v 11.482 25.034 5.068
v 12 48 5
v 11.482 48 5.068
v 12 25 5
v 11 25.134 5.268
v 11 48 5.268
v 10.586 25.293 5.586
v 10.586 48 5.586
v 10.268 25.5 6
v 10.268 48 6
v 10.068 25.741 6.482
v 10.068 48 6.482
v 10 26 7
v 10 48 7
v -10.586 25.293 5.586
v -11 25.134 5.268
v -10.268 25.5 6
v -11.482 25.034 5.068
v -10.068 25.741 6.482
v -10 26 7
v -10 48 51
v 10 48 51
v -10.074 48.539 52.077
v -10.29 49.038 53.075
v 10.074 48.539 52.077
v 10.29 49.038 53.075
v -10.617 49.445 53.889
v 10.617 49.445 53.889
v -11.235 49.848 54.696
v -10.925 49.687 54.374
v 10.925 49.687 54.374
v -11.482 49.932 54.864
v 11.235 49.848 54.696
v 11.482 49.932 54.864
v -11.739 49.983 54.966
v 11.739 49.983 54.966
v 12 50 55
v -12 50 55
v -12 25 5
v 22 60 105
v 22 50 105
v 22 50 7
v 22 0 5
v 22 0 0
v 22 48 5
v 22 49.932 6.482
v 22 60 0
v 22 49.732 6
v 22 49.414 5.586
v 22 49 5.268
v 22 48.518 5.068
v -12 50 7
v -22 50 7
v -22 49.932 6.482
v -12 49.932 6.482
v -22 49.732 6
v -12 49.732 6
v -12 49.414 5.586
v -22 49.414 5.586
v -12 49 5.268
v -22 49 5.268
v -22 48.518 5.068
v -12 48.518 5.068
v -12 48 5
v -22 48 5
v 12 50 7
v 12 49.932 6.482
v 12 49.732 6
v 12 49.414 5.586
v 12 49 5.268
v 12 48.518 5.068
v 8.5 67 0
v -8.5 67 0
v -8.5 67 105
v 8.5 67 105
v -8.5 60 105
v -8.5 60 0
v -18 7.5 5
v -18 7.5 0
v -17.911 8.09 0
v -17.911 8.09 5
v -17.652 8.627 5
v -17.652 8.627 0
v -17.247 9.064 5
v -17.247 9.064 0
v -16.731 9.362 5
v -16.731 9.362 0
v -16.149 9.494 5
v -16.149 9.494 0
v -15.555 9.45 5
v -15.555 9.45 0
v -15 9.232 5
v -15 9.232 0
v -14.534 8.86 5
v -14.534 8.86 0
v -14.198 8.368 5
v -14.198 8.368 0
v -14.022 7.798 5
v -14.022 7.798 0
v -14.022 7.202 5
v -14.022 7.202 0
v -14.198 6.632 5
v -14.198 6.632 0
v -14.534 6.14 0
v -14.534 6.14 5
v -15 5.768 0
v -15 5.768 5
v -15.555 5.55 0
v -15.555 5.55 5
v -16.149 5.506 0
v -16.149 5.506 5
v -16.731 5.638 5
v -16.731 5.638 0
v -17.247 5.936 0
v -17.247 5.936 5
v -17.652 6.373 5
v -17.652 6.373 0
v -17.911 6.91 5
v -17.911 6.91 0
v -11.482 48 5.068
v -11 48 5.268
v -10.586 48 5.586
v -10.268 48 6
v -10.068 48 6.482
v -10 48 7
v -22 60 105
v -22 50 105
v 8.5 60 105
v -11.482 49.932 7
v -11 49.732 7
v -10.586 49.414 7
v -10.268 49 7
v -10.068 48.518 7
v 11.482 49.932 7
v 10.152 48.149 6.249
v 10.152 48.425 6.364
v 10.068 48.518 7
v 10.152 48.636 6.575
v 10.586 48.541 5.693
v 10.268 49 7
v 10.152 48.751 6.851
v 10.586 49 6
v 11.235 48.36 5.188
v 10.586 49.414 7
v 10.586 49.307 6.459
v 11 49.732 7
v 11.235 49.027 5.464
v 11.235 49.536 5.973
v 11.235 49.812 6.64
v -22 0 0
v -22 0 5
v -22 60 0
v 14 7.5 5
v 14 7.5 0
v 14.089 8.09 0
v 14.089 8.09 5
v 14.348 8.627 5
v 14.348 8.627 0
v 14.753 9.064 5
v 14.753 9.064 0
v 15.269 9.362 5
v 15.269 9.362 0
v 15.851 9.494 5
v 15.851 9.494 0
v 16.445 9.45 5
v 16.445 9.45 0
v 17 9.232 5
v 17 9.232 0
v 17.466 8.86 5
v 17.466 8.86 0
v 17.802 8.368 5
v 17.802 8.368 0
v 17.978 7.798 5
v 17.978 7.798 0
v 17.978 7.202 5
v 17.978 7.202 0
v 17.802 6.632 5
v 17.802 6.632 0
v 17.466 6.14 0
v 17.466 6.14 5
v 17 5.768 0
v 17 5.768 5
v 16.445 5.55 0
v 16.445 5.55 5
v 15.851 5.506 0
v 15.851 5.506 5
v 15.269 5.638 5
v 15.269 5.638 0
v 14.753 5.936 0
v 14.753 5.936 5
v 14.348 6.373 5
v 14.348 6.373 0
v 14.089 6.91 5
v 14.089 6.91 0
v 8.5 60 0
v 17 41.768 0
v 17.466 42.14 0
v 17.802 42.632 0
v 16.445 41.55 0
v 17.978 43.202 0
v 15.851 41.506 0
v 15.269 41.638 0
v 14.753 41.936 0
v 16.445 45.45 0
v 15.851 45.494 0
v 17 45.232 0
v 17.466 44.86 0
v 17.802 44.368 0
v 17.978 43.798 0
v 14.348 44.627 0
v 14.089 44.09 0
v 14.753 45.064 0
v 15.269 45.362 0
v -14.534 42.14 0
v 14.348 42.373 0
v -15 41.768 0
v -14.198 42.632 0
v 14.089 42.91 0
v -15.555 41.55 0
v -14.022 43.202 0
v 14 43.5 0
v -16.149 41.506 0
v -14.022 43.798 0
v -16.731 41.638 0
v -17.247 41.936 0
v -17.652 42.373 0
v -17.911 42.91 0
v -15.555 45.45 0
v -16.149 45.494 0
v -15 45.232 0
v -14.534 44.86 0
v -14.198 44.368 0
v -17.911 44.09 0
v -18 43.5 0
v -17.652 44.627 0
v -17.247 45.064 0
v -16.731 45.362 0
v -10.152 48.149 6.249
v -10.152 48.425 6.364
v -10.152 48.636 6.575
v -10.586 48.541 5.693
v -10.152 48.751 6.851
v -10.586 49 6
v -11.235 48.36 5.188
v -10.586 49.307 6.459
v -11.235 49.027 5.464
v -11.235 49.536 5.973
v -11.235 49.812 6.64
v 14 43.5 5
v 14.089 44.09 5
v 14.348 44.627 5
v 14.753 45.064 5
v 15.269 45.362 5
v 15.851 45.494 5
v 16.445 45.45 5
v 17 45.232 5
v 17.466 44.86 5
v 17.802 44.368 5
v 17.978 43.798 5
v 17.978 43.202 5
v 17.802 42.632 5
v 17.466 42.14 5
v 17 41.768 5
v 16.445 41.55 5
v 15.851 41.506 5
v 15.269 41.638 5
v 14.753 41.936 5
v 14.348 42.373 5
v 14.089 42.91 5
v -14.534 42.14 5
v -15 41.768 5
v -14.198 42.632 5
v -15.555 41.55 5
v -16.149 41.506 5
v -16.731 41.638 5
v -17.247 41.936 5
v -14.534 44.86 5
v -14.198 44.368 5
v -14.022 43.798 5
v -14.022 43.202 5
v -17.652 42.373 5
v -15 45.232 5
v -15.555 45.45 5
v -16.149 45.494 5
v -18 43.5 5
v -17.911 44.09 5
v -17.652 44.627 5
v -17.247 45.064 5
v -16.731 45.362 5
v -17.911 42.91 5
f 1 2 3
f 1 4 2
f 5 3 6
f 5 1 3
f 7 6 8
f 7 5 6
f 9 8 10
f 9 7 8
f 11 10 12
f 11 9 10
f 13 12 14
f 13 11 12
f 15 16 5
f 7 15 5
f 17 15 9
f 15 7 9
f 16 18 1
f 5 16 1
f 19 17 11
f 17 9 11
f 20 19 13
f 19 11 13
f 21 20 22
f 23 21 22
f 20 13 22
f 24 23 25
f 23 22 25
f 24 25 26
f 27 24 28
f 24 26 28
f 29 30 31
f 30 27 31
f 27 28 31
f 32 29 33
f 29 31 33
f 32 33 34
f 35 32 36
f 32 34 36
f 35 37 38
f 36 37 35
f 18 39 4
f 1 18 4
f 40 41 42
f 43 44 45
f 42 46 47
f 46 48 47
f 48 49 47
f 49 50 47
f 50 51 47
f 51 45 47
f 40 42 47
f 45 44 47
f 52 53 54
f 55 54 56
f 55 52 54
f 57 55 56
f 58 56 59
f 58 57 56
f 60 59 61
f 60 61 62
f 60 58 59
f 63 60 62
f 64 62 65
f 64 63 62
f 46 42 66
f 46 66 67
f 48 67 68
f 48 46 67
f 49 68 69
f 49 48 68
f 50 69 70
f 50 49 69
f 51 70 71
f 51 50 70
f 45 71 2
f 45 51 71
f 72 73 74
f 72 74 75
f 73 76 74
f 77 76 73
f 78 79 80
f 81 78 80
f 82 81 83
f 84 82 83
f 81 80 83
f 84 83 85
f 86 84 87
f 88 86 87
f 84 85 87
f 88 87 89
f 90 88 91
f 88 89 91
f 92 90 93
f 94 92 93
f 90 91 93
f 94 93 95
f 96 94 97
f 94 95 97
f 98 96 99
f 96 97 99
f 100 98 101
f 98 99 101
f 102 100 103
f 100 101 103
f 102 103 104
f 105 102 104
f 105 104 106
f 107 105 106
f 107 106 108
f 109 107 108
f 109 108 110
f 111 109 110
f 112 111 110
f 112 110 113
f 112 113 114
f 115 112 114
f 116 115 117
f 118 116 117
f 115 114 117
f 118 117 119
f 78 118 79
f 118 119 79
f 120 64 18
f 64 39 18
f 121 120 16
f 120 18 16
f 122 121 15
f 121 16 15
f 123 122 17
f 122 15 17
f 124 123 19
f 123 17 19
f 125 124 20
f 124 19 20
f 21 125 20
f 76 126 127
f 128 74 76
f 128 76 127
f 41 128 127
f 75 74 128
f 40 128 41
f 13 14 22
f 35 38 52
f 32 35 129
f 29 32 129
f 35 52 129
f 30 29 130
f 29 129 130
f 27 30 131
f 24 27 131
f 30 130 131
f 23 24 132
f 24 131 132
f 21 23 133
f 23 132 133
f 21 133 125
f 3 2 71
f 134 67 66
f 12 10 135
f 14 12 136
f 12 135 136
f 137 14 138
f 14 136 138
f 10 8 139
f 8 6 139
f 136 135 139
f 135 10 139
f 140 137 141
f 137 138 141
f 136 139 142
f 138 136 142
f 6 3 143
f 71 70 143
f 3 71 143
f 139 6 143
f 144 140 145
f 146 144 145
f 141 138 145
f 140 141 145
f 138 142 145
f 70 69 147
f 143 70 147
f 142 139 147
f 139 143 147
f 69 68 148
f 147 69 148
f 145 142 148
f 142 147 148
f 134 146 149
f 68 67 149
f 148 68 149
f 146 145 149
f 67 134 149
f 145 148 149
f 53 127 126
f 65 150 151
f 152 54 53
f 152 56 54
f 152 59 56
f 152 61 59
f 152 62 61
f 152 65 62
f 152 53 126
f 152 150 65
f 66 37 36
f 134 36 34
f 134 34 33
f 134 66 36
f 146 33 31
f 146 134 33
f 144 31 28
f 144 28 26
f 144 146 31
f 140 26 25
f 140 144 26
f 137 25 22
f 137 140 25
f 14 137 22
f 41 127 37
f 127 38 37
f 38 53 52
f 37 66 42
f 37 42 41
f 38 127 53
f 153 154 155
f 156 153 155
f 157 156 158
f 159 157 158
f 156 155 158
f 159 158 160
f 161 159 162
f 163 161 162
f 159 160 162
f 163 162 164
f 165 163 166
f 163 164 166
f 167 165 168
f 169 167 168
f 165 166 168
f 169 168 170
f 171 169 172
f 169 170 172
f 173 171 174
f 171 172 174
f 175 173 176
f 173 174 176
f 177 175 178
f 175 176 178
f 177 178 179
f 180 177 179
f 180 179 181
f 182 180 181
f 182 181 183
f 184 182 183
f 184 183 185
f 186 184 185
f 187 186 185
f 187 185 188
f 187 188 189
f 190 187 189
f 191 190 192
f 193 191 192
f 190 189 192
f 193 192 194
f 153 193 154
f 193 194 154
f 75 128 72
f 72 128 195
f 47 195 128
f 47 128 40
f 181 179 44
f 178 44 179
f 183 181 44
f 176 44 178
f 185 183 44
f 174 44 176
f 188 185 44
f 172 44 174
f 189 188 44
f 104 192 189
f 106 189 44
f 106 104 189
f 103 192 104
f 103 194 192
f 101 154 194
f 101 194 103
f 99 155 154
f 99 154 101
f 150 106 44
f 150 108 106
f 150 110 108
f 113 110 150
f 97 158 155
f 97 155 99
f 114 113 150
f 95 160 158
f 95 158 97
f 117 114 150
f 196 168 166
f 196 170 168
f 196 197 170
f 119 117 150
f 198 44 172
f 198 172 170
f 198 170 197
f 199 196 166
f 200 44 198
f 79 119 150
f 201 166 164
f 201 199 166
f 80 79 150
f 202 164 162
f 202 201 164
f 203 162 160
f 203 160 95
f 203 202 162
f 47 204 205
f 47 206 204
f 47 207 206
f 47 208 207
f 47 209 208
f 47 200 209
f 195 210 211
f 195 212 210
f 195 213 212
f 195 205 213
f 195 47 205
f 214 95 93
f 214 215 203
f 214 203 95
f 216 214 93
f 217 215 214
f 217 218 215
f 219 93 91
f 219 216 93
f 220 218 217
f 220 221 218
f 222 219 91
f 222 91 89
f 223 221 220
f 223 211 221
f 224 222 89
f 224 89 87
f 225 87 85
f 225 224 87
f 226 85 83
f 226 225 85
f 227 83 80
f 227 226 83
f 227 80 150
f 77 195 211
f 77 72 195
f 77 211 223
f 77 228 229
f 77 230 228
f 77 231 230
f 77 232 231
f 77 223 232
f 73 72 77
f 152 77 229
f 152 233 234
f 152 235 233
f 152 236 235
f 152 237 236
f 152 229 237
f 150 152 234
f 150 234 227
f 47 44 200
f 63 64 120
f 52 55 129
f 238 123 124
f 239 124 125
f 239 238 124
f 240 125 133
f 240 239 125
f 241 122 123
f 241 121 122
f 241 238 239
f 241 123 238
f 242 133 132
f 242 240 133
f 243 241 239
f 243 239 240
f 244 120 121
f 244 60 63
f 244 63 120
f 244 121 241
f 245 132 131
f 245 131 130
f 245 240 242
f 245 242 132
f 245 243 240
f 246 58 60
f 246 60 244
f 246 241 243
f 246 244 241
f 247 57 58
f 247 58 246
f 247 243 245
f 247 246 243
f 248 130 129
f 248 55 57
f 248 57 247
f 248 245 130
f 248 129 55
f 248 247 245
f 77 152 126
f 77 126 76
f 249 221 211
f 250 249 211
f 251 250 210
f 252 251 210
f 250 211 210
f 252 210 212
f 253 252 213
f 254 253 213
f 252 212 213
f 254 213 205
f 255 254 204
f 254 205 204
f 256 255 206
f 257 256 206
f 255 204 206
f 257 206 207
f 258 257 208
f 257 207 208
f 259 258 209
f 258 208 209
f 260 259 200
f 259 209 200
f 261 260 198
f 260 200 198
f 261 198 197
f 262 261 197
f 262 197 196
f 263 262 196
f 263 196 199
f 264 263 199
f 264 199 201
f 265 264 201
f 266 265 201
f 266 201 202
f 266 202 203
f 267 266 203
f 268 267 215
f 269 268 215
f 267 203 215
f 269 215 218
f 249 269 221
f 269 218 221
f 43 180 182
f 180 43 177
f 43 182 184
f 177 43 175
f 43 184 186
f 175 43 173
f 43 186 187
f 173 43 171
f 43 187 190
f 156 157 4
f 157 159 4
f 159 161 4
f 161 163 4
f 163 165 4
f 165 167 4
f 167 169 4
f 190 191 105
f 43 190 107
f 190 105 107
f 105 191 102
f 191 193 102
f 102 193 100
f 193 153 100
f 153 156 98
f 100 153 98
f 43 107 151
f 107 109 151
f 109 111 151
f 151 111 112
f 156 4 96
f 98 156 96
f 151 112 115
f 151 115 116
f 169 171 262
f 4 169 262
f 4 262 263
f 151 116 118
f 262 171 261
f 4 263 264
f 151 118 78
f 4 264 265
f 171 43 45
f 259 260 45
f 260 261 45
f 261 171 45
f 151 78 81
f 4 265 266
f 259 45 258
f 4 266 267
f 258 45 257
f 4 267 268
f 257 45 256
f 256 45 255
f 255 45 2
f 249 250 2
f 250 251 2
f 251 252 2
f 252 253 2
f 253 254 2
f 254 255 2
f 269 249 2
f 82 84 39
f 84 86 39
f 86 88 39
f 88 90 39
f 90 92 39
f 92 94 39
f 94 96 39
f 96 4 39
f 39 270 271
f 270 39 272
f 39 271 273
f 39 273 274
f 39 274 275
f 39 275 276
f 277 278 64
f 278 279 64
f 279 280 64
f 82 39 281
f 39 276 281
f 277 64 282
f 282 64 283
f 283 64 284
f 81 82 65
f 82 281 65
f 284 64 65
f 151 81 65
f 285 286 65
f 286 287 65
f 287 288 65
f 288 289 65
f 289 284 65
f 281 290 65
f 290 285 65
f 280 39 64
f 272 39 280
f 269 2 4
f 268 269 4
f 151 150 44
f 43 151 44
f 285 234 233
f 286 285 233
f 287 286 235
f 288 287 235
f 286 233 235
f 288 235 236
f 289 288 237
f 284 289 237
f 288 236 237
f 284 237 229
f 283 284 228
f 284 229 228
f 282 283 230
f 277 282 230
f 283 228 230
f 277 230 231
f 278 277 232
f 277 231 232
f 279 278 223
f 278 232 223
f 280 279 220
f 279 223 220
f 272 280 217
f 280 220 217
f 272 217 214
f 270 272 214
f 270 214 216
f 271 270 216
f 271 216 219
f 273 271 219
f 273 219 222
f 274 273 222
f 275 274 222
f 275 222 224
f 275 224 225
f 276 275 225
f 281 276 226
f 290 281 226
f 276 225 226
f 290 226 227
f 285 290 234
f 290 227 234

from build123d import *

# Parameters (mm, degrees)
BOSS_EXTRUDE1_DEPTH = 5
SKETCH2_R           = 2
CUT_EXTRUDE1_DEPTH  = 5
SKETCH3_W           = 44
SKETCH3_H           = 10
BOSS_EXTRUDE2_DEPTH = 100
BOSS_EXTRUDE3_DEPTH = 10
FILLET1_R           = 2
SKETCH5_W           = 17
SKETCH5_H           = 105
BOSS_EXTRUDE4_DEPTH = 7


with BuildPart() as part:
    # Sketch1 → Boss-Extrude1 (new body)
    with BuildSketch(Plane.XY):
        Polygon((0, 0), (-22, 0), (-22, 60), (22, 60), (22, 0), align=None)
    extrude(amount=BOSS_EXTRUDE1_DEPTH)

    # Sketch2 → Cut-Extrude1 (cut)
    with BuildSketch(Plane(origin=(0, 0, 0), x_dir=(-1, 0, 0), z_dir=(0, 0, -1))):
        with Locations((-16, 43.5)):
            Circle(SKETCH2_R)
        with Locations((16, 43.5)):
            Circle(SKETCH2_R)
        with Locations((-16, 7.5)):
            Circle(SKETCH2_R)
        with Locations((16, 7.5)):
            Circle(SKETCH2_R)
    extrude(amount=-CUT_EXTRUDE1_DEPTH, mode=Mode.SUBTRACT)

    # Sketch3 → Boss-Extrude2 (add)
    with BuildSketch(Plane.XY.offset(5)):
        with Locations((0, 55)):
            Rectangle(SKETCH3_W, SKETCH3_H)
    extrude(amount=BOSS_EXTRUDE2_DEPTH)

    # Sketch4 → Boss-Extrude3 (add, symmetric)
    with BuildSketch(Plane(origin=(0, 0, 0), x_dir=(0, 0, -1), z_dir=(1, 0, 0))):
        Polygon((-5, 50), (-5, 25), (-55, 50), align=None)
    extrude(amount=BOSS_EXTRUDE3_DEPTH, both=True)

    # Fillet1
    fillet1_edges = [part.edges().sort_by_distance(p)[0] for p in [
        (16, 50, 5),
        (10, 37.5, 5),
        (10, 50, 30),
        (-16, 50, 5),
        (-10, 37.5, 5),
        (-10, 50, 30),
    ]]
    fillet(fillet1_edges, radius=FILLET1_R)

    # Sketch5 → Boss-Extrude4 (add)
    with BuildSketch(Plane(origin=(0, 60, 0), x_dir=(1, 0, 0), z_dir=(0, 1, 0))):
        with Locations((0, -52.5)):
            Rectangle(SKETCH5_W, SKETCH5_H)
    extrude(amount=BOSS_EXTRUDE4_DEPTH)


solid = part.part
